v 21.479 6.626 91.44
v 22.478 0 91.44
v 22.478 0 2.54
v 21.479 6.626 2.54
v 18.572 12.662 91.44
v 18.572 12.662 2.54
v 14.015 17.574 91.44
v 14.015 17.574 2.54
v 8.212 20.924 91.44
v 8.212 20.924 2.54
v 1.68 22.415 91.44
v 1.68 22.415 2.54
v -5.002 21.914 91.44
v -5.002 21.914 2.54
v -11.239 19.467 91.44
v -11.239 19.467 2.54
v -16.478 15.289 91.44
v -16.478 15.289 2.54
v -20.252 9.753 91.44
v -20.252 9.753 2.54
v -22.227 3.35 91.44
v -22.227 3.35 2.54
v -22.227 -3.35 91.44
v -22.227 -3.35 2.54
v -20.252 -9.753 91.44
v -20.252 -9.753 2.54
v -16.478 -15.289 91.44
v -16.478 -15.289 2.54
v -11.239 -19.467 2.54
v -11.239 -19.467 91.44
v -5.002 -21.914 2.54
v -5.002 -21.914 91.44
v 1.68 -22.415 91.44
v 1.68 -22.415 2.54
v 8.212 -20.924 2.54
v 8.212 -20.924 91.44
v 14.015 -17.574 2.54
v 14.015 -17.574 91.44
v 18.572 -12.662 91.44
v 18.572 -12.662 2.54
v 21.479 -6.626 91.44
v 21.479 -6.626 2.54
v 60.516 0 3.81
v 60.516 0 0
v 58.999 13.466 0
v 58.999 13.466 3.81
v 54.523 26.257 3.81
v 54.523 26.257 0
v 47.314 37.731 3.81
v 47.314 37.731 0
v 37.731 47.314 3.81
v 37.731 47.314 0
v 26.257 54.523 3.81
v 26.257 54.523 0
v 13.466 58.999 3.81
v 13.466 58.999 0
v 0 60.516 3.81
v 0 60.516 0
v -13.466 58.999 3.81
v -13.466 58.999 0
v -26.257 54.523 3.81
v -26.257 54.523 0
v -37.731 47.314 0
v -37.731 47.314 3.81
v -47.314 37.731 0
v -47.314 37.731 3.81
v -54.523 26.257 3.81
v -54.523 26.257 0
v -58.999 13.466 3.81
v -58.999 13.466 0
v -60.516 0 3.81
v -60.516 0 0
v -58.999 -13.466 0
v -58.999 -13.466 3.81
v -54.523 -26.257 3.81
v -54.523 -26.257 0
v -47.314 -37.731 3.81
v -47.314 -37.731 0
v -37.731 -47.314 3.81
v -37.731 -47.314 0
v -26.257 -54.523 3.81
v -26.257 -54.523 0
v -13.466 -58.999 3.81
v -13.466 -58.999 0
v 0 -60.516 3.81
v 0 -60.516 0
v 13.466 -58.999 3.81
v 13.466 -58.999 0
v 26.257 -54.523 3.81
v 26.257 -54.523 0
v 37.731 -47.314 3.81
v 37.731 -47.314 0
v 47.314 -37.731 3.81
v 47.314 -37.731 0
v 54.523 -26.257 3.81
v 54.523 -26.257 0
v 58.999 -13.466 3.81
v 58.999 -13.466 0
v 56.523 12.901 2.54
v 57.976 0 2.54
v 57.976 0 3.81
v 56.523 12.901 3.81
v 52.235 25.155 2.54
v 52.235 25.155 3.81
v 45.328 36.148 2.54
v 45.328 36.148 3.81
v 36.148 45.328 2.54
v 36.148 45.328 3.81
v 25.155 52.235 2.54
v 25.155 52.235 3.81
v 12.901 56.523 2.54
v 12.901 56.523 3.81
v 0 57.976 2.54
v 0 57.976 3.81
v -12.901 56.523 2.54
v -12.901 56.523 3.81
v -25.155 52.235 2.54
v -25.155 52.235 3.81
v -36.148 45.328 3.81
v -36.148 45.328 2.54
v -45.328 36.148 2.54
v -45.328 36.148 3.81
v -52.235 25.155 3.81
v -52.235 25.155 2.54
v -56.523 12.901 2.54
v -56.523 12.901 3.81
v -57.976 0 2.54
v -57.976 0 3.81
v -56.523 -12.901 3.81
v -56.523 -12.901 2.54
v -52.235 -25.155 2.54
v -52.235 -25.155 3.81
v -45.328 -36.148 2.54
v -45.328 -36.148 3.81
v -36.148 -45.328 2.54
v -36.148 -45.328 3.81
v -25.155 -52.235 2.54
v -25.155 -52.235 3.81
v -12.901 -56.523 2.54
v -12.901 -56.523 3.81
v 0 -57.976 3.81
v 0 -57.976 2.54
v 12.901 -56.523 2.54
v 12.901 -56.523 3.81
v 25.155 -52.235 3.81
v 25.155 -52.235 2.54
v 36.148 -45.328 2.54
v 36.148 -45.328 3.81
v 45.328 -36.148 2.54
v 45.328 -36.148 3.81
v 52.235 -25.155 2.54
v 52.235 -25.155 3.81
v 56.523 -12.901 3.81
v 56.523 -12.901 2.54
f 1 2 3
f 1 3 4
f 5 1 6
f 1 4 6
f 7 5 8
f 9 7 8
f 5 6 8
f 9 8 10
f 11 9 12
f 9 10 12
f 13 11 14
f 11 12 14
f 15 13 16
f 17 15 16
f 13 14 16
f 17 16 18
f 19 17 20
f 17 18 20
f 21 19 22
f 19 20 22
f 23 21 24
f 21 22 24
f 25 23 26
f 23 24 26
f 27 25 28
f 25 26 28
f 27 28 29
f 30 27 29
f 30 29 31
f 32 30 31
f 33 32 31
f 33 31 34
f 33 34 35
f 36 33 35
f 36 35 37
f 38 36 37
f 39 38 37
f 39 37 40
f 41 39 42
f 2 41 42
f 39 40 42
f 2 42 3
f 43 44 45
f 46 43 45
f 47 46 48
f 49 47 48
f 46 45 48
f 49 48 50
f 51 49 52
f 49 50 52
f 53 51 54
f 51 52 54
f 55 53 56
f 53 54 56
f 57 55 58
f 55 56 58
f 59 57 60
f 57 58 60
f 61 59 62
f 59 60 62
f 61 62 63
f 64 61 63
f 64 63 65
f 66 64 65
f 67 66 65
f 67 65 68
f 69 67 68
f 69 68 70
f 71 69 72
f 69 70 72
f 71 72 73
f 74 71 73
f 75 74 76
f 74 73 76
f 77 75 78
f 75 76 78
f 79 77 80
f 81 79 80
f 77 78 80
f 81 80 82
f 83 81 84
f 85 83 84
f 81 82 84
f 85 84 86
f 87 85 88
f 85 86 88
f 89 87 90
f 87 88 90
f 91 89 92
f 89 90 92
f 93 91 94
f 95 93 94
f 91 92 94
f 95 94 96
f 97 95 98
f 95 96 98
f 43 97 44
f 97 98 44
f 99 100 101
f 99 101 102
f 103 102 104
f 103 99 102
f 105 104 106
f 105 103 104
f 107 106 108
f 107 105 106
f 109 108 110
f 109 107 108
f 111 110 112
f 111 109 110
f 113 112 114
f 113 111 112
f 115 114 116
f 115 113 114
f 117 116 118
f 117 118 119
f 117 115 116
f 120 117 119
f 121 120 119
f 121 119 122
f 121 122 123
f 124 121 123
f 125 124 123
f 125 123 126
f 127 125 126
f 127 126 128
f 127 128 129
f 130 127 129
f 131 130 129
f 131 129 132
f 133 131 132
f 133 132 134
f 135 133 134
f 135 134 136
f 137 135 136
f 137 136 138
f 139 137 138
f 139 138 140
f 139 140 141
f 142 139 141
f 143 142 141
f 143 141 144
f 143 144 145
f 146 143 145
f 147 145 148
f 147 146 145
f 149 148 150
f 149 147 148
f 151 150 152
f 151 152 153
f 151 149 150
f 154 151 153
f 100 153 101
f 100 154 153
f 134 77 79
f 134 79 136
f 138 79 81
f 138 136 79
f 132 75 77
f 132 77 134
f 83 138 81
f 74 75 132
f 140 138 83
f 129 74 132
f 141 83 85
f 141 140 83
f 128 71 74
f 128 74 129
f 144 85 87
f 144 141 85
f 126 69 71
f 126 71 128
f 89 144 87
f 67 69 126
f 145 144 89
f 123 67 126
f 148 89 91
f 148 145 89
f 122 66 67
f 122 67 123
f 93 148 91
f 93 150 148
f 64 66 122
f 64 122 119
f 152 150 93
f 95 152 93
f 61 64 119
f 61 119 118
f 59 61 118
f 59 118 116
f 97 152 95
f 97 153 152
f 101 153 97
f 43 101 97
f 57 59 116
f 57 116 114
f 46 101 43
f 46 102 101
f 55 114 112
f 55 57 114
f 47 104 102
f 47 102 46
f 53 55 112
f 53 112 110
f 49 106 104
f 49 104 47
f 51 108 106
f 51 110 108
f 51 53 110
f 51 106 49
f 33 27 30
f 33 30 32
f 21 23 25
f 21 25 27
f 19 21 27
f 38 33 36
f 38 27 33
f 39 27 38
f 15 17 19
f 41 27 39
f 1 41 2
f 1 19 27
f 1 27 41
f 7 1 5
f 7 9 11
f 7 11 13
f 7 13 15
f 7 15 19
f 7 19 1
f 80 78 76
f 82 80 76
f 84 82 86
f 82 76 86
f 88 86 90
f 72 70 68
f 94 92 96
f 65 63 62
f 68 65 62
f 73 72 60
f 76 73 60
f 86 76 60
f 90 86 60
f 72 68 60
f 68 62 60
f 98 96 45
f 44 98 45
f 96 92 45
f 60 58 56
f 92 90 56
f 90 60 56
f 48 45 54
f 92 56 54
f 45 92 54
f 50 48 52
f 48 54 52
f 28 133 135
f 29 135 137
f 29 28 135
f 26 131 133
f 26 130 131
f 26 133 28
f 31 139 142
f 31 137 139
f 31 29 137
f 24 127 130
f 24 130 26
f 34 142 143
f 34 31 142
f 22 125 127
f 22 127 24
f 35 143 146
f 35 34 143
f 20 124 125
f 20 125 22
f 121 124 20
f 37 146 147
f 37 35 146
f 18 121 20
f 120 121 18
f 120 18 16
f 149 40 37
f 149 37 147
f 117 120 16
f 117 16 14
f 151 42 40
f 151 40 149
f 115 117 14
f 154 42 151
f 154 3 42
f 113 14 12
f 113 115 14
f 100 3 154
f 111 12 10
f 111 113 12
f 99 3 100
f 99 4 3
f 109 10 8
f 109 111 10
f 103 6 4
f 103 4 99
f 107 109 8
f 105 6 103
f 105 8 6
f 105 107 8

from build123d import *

# Parameters (mm, degrees)
F0_R     = 60.516336
F1_DEPTH = 3.81
F2_T     = -2.54
F3_R     = 22.478017
F4_DEPTH = 88.9


with BuildPart() as f1:
    # F0 (on Top) → F1 (new body)
    with BuildSketch(Plane.XY):
        Circle(F0_R)
    extrude(amount=F1_DEPTH)

    # F2
    f2_openings = [f1.faces().sort_by_distance(p)[0] for p in [
        (0, 0, 3.81),
    ]]
    offset(amount=F2_T, openings=f2_openings)

    # F3 (on face) → F4 (join)
    with BuildSketch(Plane.XY.offset(2.54)):
        Circle(F3_R)
    extrude(amount=F4_DEPTH)


solid = f1.part
